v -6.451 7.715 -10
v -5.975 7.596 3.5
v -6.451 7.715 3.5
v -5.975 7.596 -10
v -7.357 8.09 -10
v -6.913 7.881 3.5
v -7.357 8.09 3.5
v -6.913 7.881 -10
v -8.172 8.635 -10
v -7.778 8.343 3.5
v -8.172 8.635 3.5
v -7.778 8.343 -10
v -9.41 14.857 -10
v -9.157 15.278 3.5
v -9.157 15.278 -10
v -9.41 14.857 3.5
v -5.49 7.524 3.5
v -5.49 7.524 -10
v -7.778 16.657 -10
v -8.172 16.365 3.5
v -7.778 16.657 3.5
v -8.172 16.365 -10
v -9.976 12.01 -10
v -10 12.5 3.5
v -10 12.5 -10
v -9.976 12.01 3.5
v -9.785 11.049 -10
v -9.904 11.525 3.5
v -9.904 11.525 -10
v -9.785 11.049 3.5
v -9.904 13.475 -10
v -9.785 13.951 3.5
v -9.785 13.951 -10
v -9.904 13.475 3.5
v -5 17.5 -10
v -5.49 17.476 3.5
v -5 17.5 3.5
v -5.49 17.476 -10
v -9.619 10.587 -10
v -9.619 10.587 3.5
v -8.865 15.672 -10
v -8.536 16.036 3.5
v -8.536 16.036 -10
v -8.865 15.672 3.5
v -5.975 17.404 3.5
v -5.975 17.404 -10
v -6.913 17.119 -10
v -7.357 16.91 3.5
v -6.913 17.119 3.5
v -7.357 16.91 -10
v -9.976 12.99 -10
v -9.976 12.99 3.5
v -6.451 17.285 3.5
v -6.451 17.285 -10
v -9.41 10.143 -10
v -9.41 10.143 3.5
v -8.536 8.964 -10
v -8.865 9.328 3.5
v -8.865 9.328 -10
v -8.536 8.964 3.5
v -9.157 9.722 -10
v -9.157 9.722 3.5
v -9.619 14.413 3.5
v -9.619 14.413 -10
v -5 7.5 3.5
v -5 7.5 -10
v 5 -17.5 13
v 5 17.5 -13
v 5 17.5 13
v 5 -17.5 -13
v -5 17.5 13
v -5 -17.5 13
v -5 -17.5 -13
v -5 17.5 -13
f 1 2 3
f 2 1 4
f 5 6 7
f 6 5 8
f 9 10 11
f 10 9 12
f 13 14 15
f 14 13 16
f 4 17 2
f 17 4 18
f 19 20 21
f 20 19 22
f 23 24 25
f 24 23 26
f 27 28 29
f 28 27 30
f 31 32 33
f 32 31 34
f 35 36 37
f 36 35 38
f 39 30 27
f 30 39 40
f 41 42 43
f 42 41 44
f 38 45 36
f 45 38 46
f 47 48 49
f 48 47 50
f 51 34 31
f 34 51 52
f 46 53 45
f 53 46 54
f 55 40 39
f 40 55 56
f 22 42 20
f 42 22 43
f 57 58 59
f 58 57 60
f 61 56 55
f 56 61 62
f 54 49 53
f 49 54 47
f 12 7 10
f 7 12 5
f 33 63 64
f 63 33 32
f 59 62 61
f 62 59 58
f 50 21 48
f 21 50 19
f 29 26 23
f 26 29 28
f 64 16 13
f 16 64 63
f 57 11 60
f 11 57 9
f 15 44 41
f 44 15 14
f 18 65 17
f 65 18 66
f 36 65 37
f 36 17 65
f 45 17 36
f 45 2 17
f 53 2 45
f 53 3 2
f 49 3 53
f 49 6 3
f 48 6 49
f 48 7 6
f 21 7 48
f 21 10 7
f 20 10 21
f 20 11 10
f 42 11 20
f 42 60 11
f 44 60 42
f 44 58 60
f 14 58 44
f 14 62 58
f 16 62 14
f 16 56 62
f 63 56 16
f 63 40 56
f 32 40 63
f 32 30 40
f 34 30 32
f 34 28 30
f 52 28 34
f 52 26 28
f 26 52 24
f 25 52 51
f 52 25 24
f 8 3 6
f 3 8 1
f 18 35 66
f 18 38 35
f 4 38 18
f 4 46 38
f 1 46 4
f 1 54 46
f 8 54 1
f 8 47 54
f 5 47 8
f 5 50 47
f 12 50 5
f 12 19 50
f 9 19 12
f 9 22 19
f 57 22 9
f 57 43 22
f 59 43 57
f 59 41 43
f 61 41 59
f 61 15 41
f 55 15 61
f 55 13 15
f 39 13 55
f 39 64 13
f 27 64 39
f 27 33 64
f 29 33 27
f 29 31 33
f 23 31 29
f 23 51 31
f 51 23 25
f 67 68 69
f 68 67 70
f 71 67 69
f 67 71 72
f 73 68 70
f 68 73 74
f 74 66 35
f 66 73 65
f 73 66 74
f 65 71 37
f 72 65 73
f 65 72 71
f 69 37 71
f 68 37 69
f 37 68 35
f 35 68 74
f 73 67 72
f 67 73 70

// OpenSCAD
module paddle() {
    // Main body dimensions
    body_length = 35.0;
    body_width = 10.0;
    body_height = 26.0;
    
    // Peg dimensions
    peg_length = 8.5;
    peg_diameter = 10.0;
    shoulder_height = 5.0;
    
    // Create the main body
    translate([-body_width/2, -body_length/2, -body_height/2])
        cube([body_width, body_length, body_height]);
    
    // Create the peg with a shoulder
    translate([-peg_diameter/2, body_length/2 - shoulder_height, -peg_diameter/2])
        union() {
            // Peg cylinder
            cylinder(h = peg_length, d = peg_diameter, $fn = 64);
            // Shoulder
            translate([0, 0, -shoulder_height])
                cylinder(h = shoulder_height, d = peg_diameter, $fn = 64);
        }
}

paddle();
